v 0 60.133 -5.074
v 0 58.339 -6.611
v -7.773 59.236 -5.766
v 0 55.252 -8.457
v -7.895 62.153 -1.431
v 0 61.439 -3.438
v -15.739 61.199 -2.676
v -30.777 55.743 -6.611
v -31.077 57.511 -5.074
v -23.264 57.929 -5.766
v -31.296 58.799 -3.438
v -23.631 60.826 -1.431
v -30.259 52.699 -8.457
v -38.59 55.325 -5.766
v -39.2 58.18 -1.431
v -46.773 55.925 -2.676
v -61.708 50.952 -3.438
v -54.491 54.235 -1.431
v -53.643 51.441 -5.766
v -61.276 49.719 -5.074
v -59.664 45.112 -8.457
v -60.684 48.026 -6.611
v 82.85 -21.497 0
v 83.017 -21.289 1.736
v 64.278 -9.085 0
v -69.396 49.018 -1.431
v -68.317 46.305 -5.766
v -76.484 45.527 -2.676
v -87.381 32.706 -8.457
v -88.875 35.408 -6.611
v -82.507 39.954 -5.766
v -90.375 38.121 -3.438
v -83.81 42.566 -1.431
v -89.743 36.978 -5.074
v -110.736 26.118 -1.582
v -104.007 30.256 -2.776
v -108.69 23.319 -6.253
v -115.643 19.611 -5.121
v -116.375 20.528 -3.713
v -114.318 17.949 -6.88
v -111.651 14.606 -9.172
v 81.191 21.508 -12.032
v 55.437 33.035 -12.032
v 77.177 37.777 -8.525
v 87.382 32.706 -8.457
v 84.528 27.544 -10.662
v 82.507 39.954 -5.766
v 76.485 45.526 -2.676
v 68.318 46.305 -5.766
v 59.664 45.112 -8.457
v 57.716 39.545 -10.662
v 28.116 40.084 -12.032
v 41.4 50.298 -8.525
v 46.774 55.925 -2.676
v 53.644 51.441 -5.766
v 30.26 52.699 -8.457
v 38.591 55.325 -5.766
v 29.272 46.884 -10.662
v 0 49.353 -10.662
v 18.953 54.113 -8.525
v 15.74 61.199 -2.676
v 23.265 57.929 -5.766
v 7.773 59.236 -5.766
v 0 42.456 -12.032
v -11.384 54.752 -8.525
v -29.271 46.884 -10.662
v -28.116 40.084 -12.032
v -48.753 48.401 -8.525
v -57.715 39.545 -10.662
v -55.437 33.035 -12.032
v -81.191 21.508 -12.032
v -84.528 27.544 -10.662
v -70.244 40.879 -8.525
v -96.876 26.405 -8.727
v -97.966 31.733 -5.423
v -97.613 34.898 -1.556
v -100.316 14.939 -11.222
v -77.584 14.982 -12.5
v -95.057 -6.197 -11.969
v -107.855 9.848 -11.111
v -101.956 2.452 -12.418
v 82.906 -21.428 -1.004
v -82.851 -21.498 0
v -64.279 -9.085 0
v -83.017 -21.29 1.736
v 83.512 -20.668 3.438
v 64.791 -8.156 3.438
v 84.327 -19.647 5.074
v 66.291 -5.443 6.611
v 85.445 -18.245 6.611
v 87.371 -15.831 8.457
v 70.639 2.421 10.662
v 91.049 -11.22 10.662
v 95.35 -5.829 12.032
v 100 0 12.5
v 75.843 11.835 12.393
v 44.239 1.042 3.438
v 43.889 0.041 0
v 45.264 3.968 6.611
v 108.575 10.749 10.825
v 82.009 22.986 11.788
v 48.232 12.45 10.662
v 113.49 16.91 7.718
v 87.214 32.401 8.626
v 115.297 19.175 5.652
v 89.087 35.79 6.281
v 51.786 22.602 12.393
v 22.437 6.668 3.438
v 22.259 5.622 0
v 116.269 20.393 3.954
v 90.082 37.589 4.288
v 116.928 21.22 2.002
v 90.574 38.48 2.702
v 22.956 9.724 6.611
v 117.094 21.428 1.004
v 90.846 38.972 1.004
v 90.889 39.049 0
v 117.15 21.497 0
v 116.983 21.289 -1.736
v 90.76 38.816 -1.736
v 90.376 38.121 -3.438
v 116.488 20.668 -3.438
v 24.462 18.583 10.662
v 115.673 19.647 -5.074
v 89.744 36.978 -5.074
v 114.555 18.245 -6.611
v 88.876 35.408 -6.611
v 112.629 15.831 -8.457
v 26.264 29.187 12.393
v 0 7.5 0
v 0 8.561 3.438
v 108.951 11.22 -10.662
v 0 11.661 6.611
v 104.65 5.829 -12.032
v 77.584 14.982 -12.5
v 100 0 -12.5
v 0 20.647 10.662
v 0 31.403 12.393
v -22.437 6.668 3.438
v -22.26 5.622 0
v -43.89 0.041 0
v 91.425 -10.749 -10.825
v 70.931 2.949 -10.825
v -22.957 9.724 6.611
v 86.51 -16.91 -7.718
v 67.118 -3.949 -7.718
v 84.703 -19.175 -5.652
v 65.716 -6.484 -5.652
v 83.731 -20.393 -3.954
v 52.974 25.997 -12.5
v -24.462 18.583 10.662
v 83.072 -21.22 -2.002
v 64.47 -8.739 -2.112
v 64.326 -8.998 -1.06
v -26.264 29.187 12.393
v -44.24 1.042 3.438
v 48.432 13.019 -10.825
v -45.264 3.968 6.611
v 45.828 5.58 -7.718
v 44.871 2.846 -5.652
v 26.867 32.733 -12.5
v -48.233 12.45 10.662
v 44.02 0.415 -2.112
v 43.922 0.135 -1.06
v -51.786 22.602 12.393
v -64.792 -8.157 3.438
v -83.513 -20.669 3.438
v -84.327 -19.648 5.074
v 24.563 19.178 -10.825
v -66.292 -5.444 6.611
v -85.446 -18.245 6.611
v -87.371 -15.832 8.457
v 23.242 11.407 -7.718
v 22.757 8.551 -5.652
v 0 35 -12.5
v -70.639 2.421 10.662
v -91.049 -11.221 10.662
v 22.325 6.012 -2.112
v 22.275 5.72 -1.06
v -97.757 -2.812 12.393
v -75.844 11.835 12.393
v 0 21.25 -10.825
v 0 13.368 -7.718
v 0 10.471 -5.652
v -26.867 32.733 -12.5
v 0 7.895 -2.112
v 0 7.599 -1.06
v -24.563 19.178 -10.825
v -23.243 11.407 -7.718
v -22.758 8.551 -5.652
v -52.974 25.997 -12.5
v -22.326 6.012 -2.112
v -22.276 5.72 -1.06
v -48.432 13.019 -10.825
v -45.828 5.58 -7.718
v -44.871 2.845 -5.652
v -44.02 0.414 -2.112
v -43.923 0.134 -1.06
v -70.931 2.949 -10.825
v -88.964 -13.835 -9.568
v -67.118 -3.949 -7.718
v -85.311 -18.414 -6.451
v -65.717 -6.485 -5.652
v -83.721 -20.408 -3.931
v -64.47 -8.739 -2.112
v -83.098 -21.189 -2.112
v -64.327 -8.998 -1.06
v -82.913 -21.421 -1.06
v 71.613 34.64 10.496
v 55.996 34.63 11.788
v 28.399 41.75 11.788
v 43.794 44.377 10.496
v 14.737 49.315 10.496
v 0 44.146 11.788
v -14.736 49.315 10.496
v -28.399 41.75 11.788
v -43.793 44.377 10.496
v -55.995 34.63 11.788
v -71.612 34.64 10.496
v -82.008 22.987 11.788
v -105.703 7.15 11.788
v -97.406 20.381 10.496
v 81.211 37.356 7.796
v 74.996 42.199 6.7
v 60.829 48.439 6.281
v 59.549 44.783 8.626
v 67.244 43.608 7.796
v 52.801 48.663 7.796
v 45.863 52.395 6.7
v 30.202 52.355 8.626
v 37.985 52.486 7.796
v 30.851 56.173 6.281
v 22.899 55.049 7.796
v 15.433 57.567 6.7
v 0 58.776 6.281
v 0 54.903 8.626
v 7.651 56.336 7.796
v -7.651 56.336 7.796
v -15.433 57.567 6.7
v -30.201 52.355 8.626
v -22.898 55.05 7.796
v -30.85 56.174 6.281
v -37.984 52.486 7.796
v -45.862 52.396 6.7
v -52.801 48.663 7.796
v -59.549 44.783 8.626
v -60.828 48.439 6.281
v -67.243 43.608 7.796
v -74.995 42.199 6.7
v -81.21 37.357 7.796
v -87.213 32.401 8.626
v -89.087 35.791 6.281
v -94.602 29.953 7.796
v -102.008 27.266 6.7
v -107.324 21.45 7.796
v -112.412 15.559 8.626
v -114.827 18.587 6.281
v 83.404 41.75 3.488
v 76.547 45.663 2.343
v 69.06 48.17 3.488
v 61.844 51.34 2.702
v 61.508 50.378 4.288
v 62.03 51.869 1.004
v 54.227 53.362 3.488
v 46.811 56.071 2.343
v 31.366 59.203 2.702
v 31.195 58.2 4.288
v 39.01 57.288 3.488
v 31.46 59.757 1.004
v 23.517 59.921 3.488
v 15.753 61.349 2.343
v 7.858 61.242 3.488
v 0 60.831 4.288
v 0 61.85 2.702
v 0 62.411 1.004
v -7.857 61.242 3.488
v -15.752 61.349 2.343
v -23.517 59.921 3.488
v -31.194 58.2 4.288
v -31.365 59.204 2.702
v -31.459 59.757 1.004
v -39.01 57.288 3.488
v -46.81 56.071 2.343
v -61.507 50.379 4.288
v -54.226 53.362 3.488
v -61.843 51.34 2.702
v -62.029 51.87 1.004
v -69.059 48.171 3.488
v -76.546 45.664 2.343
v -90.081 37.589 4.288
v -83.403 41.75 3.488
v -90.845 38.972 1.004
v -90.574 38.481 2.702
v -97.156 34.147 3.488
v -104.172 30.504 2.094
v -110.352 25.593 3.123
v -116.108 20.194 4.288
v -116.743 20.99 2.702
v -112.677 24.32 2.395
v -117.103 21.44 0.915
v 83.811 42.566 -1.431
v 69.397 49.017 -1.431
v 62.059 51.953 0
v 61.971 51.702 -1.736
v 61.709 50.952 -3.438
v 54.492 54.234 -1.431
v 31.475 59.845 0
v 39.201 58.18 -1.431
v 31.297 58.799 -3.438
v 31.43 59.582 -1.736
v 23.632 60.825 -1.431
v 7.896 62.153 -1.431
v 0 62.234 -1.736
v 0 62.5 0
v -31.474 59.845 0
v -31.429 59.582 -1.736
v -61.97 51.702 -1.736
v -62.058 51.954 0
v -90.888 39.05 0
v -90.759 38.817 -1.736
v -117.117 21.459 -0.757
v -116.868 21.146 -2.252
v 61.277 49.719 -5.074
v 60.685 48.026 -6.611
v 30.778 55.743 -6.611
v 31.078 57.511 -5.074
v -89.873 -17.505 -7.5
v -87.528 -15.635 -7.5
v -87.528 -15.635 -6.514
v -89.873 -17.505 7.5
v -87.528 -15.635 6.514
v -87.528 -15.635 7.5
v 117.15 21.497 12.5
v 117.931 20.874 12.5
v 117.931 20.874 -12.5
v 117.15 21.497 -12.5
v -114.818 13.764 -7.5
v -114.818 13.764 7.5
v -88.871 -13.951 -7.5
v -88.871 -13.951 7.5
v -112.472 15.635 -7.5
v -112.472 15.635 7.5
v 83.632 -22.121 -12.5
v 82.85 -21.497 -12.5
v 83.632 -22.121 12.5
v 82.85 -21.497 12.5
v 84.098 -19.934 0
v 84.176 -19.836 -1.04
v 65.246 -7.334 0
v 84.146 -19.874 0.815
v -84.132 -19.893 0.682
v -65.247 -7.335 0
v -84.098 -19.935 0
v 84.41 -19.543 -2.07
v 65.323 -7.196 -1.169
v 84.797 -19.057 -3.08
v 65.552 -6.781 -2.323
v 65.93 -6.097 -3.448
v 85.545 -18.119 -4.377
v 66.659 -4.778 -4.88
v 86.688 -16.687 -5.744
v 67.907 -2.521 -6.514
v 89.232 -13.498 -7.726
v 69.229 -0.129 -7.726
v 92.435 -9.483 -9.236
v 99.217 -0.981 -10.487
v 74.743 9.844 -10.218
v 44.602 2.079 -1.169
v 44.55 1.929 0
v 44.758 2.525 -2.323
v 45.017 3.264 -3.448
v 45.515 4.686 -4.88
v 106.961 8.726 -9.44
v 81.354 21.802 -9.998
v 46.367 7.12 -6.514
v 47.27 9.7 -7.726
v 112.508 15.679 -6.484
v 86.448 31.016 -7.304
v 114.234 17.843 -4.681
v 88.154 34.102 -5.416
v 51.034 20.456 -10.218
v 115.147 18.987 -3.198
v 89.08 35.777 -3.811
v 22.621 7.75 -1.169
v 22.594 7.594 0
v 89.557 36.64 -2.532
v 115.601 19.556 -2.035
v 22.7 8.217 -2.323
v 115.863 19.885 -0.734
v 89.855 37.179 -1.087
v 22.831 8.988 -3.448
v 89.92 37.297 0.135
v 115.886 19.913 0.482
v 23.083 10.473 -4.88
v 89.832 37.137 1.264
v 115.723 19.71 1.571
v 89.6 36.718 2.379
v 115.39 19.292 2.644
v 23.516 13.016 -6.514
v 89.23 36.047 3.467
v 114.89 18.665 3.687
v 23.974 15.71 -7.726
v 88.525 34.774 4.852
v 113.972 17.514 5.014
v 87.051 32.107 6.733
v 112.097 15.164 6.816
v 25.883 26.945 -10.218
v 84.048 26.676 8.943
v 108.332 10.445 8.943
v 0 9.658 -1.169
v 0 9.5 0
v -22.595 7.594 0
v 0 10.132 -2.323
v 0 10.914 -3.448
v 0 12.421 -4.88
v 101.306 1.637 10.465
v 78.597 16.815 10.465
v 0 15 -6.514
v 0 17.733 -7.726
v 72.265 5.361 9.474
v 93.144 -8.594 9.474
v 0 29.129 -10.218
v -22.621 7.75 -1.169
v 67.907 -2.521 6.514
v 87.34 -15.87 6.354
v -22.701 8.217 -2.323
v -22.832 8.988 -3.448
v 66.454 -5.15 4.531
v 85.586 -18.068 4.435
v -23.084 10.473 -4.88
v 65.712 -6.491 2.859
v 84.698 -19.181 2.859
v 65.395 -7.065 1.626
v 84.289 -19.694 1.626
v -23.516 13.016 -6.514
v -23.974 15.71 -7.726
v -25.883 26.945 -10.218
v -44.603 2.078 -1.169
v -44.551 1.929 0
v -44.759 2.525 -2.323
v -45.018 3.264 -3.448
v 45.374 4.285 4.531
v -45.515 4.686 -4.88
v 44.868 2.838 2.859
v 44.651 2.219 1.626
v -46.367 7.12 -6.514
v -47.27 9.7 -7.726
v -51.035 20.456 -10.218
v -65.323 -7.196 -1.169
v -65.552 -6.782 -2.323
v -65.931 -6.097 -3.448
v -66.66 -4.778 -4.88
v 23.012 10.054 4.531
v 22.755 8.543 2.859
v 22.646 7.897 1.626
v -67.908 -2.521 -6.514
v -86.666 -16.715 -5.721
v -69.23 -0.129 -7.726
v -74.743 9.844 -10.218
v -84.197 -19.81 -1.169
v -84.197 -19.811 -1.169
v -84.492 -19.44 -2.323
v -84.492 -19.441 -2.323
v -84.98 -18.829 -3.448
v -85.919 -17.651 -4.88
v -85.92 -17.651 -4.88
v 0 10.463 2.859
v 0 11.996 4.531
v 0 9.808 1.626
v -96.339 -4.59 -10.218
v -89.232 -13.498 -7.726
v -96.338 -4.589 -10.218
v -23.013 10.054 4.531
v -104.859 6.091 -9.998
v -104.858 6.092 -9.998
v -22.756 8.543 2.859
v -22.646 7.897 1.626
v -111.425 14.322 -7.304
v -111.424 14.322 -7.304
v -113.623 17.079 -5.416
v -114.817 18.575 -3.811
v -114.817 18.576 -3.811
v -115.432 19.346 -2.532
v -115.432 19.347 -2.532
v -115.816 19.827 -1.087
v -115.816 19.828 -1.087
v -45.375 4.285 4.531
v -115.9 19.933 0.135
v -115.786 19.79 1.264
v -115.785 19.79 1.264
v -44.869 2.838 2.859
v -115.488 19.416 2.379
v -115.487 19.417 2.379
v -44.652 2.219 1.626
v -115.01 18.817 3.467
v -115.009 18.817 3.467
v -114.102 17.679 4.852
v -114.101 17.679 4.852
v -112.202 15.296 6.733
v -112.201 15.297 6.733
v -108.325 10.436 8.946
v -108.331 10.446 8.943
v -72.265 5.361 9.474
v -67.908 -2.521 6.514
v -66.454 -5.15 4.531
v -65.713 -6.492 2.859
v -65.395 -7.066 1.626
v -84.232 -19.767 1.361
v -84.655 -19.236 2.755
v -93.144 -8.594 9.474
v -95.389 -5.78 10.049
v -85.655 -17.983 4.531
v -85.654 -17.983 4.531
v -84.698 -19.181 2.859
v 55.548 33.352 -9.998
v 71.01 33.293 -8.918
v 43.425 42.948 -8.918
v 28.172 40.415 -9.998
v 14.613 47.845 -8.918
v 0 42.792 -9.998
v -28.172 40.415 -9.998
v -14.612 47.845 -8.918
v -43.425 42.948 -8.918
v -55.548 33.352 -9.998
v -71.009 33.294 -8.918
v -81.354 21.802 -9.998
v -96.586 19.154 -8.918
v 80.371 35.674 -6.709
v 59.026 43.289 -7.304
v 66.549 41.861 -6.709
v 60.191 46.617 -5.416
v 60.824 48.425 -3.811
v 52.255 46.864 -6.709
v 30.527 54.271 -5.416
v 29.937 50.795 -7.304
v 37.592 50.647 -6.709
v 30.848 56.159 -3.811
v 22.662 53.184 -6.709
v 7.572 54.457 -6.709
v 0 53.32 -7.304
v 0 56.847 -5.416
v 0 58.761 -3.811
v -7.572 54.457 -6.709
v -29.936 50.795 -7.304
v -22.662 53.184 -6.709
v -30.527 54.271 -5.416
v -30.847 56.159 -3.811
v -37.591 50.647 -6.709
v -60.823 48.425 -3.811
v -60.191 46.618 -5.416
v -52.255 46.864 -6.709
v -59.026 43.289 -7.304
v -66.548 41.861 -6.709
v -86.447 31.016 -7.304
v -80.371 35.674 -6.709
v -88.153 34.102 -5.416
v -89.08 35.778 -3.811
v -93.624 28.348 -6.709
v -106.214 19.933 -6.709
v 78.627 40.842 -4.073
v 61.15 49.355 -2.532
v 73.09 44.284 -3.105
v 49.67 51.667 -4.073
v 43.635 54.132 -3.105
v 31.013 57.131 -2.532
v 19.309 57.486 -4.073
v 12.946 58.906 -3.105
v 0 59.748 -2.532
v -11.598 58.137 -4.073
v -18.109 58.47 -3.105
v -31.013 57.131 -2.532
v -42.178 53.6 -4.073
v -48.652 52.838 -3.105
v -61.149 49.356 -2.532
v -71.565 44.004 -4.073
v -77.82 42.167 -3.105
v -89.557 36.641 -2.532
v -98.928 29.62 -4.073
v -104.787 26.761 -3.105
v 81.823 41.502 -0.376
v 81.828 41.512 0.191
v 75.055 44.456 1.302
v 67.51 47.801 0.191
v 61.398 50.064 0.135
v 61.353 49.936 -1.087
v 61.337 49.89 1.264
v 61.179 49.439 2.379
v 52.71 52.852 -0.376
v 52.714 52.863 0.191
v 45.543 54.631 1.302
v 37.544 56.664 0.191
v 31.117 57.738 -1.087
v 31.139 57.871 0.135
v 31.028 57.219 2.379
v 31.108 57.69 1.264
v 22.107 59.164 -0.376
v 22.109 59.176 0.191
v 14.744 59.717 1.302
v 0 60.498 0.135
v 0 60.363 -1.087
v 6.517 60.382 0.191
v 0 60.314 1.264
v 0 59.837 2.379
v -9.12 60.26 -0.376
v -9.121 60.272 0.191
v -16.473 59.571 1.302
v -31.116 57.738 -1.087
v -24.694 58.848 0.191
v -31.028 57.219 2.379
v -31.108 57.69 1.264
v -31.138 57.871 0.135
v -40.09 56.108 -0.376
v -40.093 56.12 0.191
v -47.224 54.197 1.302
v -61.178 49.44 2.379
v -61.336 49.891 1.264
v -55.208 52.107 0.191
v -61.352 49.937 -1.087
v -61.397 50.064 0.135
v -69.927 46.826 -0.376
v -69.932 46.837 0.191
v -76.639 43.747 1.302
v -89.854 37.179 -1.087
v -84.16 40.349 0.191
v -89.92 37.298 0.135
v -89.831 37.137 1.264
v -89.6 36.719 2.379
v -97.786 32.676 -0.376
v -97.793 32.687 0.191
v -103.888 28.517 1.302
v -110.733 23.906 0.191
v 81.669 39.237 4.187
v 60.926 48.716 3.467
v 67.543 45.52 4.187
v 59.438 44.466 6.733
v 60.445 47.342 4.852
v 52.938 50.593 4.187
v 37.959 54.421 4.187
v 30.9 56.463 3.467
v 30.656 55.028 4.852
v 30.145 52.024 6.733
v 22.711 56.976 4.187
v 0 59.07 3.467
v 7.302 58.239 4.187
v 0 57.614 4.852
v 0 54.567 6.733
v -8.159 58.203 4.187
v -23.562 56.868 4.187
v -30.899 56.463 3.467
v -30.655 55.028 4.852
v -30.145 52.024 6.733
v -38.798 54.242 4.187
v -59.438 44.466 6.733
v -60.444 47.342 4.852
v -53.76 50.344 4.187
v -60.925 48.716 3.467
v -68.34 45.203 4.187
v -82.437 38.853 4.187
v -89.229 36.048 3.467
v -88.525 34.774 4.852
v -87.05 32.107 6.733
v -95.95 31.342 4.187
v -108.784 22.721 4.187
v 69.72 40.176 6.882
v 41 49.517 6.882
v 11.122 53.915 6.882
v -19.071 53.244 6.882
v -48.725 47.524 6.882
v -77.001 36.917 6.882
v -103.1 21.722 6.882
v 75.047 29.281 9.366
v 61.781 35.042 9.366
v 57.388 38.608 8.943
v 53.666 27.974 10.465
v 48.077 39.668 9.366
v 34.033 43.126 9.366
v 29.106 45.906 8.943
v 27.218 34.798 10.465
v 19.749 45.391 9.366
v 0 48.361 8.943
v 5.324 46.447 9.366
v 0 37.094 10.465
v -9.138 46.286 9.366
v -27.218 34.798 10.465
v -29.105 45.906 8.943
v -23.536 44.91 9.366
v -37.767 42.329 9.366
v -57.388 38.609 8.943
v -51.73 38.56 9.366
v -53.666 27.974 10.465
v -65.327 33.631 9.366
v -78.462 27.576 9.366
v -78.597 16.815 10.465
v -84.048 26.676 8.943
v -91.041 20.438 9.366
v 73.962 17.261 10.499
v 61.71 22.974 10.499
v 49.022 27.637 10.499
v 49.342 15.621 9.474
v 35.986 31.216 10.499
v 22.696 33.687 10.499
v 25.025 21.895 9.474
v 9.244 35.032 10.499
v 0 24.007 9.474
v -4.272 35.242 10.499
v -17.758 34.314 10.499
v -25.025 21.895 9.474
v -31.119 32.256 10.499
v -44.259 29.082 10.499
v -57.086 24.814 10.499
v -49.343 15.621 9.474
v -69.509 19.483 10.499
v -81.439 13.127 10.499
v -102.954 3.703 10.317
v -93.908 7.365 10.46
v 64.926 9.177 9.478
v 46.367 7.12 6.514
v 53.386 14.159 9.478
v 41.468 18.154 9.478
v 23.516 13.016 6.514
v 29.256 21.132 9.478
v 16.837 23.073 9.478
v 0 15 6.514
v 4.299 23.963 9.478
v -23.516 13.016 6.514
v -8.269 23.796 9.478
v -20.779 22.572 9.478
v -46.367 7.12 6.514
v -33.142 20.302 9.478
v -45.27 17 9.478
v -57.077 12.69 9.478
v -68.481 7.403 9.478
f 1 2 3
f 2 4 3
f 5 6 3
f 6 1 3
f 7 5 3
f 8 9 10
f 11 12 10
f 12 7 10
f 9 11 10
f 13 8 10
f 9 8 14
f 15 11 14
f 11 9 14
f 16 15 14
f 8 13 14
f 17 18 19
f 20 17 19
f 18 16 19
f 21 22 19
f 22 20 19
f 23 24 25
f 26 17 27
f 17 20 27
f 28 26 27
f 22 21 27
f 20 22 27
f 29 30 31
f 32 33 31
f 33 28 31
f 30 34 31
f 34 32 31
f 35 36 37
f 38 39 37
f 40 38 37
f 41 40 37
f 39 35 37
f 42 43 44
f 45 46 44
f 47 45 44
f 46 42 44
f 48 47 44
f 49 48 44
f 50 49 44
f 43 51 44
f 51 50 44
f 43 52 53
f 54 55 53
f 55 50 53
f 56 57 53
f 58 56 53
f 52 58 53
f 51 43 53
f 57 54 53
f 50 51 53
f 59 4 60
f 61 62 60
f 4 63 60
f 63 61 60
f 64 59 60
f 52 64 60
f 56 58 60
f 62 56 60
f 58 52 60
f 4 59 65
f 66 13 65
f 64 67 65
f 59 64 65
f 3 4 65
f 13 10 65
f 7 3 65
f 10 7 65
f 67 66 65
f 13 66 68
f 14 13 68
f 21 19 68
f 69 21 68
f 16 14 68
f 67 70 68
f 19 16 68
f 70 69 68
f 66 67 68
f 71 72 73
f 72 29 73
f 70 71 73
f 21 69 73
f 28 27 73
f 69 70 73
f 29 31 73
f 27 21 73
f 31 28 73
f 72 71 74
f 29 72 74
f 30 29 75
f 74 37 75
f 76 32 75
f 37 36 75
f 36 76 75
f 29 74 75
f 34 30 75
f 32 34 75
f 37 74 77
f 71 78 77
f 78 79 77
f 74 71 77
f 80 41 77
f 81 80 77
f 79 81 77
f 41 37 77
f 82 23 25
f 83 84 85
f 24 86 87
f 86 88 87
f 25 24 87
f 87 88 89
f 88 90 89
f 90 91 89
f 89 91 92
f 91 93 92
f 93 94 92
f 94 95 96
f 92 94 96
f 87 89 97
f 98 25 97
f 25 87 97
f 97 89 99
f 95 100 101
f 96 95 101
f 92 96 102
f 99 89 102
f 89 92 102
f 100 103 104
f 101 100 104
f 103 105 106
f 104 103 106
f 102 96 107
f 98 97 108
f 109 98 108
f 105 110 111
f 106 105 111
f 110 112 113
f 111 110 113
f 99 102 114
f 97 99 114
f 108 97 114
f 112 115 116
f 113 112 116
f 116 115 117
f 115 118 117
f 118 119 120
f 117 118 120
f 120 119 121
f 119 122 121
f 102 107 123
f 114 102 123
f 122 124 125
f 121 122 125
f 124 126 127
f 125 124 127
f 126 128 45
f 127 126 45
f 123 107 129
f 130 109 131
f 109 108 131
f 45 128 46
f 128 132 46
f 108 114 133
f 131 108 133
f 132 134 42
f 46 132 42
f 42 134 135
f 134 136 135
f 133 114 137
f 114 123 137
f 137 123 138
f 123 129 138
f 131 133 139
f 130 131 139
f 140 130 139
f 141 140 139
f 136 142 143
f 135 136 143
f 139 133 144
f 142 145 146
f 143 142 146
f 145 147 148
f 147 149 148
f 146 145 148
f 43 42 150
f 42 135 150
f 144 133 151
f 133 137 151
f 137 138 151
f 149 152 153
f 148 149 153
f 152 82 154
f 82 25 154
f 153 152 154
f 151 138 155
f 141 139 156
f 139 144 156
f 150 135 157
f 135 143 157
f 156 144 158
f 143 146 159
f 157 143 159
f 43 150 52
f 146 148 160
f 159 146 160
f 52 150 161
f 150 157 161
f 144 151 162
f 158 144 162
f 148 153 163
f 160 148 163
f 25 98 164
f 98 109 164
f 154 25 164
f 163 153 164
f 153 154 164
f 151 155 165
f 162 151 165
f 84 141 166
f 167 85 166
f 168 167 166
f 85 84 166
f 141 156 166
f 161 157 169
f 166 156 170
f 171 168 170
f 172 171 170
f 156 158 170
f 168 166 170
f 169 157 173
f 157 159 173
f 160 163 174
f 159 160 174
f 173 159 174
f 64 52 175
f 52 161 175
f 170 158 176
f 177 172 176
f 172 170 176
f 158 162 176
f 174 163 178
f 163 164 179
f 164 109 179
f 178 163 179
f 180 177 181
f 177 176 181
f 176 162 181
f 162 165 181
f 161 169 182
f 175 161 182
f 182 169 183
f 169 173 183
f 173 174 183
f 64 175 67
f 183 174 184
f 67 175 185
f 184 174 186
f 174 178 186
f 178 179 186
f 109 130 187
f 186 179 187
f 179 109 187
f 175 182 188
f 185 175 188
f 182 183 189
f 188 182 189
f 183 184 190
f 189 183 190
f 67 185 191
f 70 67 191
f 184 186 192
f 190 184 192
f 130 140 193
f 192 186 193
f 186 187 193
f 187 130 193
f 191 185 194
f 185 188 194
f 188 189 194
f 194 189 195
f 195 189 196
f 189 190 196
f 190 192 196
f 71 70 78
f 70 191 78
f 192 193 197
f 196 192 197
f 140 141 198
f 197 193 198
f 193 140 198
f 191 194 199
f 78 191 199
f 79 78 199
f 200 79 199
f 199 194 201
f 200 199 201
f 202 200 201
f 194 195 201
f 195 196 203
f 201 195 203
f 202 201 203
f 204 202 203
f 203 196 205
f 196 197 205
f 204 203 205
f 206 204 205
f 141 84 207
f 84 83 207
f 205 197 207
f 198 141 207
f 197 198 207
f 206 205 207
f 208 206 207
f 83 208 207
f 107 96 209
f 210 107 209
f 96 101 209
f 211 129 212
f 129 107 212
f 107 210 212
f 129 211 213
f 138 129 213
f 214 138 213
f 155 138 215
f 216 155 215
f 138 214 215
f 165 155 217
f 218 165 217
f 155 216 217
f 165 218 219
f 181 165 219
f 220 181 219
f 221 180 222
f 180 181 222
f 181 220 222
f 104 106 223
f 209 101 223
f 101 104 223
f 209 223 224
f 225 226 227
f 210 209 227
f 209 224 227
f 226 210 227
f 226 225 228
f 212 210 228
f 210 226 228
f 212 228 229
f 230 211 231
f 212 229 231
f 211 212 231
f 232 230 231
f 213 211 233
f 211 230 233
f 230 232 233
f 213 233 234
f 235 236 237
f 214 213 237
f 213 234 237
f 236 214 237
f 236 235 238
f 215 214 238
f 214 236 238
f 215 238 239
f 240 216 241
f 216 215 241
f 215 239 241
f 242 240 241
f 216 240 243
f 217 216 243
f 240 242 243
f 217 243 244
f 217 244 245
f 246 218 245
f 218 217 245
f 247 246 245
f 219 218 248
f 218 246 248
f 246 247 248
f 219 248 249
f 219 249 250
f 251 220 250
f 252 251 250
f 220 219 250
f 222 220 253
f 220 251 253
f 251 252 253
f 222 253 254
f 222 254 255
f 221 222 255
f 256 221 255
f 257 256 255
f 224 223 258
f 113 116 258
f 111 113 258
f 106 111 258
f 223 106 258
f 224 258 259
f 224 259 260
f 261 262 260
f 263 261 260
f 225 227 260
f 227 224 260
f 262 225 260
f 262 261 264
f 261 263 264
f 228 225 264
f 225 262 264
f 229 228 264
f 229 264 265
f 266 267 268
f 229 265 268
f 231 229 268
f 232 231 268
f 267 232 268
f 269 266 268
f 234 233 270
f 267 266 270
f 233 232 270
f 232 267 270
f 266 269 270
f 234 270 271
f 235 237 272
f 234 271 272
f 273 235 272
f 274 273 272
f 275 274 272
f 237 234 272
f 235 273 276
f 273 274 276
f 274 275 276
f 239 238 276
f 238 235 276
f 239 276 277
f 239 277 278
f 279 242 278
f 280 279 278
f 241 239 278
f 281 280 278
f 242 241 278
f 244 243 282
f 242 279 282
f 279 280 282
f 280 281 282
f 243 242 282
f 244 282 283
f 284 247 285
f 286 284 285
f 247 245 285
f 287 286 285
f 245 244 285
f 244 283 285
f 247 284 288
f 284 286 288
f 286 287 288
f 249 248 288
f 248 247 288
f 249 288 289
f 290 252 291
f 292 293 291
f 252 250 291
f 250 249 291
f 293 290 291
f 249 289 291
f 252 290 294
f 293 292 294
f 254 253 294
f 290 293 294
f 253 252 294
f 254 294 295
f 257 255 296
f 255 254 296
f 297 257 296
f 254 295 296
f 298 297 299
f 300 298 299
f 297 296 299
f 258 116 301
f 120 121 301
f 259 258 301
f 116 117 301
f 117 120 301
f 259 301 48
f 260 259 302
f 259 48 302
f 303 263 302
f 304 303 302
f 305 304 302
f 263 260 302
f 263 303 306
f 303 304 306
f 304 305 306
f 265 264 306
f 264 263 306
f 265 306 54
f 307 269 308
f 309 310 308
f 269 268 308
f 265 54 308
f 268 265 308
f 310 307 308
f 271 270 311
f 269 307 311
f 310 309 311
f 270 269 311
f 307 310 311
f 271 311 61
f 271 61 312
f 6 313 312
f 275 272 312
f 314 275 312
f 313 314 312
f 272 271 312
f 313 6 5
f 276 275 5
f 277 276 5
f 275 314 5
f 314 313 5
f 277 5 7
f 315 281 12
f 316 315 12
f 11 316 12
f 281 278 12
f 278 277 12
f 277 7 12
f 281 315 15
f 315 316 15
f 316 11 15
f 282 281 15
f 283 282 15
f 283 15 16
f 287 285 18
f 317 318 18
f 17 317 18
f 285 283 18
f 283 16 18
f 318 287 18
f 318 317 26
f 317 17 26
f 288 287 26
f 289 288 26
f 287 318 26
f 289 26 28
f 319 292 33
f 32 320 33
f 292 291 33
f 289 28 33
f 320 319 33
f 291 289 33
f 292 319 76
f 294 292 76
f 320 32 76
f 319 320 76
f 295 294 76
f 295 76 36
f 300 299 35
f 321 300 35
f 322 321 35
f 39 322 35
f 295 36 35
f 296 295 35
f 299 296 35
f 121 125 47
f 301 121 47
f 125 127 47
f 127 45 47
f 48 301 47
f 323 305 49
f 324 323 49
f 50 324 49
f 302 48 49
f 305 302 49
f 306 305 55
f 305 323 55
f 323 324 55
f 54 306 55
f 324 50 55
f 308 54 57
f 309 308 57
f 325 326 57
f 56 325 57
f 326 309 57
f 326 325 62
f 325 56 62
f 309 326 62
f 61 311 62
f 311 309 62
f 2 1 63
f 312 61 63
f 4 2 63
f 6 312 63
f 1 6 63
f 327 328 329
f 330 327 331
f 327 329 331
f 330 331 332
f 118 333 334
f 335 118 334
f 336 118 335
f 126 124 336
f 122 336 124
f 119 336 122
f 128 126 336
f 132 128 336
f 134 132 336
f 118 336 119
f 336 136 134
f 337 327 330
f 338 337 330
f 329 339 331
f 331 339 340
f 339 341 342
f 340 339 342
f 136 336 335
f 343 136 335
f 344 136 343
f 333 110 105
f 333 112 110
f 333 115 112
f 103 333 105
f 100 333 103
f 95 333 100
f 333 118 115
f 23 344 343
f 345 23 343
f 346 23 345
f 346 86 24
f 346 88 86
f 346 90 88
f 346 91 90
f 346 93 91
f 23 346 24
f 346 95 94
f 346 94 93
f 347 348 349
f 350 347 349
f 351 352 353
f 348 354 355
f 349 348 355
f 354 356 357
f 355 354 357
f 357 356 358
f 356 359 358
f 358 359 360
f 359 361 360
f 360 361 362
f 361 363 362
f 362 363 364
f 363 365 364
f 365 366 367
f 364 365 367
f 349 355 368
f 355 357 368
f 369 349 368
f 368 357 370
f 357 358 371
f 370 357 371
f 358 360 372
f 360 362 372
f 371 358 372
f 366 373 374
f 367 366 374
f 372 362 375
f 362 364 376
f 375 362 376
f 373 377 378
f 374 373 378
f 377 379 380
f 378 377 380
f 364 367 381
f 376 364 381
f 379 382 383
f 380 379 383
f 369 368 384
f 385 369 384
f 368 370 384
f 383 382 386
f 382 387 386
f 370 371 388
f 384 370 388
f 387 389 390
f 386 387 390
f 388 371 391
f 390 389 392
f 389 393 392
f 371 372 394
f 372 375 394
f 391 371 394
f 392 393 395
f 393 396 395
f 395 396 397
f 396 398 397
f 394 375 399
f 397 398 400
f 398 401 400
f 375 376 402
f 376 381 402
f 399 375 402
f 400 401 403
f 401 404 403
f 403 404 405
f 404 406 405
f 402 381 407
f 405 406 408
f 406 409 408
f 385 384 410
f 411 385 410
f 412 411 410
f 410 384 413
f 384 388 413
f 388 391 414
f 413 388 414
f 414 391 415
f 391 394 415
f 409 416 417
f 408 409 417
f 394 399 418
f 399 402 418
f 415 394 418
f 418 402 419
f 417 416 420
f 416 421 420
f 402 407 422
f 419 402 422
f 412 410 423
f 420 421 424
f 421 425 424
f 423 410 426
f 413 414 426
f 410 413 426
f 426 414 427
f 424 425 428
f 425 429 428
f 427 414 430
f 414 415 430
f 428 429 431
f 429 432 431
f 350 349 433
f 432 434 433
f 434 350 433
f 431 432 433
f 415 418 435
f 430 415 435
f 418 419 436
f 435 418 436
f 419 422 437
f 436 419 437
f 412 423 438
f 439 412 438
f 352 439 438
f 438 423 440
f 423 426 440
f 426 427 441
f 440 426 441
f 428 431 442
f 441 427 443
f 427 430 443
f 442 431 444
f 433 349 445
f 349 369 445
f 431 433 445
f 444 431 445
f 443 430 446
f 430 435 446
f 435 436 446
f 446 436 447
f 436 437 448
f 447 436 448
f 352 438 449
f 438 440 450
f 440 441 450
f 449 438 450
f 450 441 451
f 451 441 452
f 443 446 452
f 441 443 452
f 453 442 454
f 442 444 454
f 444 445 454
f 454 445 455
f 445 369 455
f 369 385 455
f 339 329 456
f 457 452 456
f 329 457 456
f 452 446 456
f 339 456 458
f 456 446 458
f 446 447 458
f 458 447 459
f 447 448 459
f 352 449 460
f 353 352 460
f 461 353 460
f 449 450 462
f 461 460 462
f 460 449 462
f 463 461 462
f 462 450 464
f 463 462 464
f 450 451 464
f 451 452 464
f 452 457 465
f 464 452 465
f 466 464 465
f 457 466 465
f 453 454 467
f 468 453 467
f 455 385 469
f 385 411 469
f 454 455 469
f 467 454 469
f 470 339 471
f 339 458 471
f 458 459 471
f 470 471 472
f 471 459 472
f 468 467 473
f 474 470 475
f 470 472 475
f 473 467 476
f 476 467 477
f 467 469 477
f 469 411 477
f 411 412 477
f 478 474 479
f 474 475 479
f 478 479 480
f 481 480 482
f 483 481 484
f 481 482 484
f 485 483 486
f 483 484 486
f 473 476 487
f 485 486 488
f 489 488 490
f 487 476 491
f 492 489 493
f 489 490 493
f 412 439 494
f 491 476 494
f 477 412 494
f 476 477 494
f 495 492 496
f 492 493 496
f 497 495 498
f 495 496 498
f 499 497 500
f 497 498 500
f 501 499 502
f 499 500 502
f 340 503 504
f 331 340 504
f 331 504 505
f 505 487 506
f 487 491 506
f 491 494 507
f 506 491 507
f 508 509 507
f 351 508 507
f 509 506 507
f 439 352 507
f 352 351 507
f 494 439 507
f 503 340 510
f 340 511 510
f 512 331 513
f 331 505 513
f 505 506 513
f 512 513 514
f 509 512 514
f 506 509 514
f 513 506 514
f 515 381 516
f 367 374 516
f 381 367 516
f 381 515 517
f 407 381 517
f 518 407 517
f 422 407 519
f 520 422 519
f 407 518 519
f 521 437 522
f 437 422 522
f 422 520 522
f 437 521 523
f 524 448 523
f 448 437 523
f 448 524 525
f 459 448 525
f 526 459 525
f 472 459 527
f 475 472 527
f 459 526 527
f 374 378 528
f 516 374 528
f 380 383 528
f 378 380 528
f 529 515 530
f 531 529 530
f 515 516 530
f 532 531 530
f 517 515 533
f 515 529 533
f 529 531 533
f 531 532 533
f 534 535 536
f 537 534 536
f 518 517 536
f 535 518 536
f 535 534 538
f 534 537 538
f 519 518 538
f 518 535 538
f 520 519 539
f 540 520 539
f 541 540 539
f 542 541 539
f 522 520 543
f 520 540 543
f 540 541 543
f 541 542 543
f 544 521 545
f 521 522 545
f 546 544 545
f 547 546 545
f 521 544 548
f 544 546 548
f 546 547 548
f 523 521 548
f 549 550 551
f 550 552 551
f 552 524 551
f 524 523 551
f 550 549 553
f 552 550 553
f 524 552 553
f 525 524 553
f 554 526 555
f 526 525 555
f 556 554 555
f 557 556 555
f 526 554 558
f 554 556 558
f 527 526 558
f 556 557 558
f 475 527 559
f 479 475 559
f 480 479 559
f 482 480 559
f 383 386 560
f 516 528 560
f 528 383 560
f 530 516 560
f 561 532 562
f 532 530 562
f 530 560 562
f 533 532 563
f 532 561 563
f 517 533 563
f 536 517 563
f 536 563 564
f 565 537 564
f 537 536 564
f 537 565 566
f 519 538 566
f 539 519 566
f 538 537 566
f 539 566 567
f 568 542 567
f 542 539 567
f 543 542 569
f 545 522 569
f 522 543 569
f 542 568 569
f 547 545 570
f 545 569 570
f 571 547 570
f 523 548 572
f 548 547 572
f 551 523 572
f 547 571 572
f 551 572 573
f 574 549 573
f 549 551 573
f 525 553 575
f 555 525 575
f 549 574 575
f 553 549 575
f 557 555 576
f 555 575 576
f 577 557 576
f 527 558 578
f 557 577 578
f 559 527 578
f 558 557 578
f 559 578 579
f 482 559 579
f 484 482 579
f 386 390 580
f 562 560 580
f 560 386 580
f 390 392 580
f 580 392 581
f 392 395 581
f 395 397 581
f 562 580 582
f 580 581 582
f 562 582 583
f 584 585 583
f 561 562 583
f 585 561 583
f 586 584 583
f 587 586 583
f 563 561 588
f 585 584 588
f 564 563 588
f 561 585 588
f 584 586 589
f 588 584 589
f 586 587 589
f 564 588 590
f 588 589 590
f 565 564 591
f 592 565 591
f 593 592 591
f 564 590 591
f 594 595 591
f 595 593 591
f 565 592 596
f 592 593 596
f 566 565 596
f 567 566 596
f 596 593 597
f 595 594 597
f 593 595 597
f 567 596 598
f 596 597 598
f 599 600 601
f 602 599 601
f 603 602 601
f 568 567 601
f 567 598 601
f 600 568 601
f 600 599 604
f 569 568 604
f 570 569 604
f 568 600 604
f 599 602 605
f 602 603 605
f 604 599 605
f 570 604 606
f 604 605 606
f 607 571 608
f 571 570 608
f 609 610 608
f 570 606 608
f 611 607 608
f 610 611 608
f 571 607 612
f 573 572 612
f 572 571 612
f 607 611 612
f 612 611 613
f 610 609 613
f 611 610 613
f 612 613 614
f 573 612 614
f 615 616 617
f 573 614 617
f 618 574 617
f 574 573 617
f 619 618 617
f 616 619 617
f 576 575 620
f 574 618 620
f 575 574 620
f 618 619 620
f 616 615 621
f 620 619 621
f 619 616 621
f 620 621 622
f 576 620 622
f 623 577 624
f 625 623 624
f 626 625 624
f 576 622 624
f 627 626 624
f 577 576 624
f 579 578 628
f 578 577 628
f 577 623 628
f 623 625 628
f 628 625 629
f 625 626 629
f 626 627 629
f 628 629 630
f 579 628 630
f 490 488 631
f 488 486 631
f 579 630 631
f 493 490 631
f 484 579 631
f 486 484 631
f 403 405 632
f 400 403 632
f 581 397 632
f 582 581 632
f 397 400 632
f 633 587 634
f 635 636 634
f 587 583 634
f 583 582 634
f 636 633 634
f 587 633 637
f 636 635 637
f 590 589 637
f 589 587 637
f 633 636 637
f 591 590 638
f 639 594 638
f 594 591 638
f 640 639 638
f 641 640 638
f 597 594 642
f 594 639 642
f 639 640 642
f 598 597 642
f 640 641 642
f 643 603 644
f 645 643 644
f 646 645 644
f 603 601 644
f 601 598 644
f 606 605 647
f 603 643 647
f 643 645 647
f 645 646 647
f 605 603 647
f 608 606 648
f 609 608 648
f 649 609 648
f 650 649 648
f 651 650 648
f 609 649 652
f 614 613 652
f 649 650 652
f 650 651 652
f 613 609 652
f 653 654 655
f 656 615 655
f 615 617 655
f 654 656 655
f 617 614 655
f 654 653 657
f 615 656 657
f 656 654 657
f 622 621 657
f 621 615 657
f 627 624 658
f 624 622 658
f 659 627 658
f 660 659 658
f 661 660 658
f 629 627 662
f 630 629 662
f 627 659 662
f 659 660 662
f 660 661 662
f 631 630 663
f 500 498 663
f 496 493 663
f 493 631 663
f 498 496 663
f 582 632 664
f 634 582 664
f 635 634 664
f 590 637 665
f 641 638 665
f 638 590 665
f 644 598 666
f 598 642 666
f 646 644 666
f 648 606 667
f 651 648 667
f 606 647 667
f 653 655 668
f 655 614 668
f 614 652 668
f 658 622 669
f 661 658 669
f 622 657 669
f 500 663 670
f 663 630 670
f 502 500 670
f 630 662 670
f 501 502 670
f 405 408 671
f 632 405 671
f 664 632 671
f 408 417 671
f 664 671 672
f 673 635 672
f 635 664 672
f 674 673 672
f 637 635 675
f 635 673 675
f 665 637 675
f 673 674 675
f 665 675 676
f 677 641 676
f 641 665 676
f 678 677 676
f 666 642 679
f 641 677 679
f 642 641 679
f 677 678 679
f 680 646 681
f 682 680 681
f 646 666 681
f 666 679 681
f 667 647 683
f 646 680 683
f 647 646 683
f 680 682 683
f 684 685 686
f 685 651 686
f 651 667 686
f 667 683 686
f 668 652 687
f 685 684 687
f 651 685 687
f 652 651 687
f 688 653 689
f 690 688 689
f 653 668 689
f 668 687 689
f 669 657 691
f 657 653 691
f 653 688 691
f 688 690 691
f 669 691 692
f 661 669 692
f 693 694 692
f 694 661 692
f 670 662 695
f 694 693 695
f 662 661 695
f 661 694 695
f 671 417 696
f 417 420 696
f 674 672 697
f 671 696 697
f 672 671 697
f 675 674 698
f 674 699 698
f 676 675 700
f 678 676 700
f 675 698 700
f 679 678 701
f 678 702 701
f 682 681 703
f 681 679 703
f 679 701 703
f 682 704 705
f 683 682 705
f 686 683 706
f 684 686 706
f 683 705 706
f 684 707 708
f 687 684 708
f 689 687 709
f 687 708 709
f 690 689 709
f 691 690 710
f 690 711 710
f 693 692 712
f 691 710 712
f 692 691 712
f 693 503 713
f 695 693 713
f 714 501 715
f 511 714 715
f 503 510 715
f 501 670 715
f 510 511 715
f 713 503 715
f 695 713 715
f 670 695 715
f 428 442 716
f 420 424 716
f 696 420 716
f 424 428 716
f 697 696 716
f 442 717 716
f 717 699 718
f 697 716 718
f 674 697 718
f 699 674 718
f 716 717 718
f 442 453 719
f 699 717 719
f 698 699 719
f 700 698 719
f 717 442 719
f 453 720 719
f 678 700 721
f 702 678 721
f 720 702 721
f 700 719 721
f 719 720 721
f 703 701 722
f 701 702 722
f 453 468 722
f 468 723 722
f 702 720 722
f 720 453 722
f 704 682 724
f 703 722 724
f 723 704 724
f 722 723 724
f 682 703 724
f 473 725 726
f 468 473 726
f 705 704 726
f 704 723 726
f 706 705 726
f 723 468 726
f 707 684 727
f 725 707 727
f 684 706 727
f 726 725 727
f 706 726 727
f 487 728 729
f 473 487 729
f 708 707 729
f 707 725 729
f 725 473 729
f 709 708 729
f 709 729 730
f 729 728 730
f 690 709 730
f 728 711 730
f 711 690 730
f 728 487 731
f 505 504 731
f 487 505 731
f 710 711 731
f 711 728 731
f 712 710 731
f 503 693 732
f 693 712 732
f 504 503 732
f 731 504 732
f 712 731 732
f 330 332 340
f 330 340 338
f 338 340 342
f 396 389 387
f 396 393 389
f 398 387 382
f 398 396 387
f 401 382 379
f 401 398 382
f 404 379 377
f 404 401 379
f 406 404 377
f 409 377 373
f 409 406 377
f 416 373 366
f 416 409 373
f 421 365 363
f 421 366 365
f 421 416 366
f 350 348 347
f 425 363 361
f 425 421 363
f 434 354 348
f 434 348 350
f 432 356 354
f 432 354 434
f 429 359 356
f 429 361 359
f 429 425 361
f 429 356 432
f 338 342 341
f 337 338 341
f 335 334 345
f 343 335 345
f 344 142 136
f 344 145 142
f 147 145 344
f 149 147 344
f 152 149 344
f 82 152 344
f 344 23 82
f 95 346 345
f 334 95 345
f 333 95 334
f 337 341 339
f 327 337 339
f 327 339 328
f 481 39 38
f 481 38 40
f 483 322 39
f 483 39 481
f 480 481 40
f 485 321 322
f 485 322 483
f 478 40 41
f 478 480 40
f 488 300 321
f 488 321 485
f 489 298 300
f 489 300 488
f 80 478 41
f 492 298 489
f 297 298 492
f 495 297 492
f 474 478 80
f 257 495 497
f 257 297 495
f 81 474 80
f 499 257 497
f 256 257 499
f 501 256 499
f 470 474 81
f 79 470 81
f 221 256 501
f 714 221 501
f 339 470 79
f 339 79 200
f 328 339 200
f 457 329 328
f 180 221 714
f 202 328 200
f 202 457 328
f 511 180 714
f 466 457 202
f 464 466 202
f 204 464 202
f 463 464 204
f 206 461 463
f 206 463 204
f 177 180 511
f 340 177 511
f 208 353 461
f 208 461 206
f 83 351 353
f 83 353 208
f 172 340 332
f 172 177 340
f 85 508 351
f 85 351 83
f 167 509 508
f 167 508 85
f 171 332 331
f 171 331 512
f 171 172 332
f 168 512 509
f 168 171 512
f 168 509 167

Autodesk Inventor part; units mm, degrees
ref_plane "YZ Plane" through (0, 0, 0) normal (1, 0, 0) x (0, 1, 0)
sketch "Sketch3" plane through (0, 0, 0) normal (0, 0, 1) x (1, 0, 0)
  line L0 (-140, 0) -> (140, 0) projected
  line L1 (0, -157.4286) -> (0, 67.0714) projected
  arc A0 (100, 0) -> (-100, 0) centre (0, -125.3571) ccw
  line L2 (-90.9685, 35) -> (88.04, 35) construction
  point P0 (0, 0)
  point P1 (0, 35)
  dimension "d0" = 200
  dimension "d1" = 35
ref_plane "Work Plane1" through (100, 0, 0) normal (-0.7817, 0.6236, 0) x (-0.6236, -0.7817, 0)
sketch "Sketch5" plane through (100, 0, 0) normal (-0.7817, 0.6236, 0) x (-0.6236, -0.7817, 0)
  ellipse E0 centre (0, 0) end of major axis (0, -12.5) minor radius 27.5
  ellipse E1 centre (0, 0) end of major axis (0, -10.5) minor radius 25.5
  point P0 (62.3608, 0)
  dimension "d2" = 27.5
  dimension "d3" = 12.5
  dimension "d4" = 25.5
  dimension "d5" = 10.5
sweep "Sweep1" add profiles "Sketch5" path "Sketch3" path curves A0
sketch "Sketch6" plane through (100, 0, 0) normal (-0.7817, 0.6236, 0) x (-0.6236, -0.7817, 0)
  line L0 (27.5, 12.5) -> (-27.5, 12.5)
  line L1 (-27.5, 12.5) -> (-27.5, -12.5)
  line L2 (-27.5, -12.5) -> (27.5, -12.5)
  line L3 (27.5, -12.5) -> (27.5, 12.5)
  line L4 (27.5, 12.5) -> (-27.5, -12.5) construction
  line L5 (-27.5, 12.5) -> (27.5, -12.5) construction
  point P0 (62.3608, 0)
  point P1 (0, 0)
  dimension "d8" = 55
  dimension "d9" = 25
extrude "Extrusion1" add sketch "Sketch6" against normal blind 1
ref_plane "Work Plane2" through (-100, 0, 0) normal (-0.7817, -0.6236, 0) x (0, 0, 1)
sketch "Sketch7" plane through (-100, 0, 0) normal (-0.7817, -0.6236, 0) x (0, 0, 1)
  line L0 (-7.5, -20) -> (7.5, -20)
  line L1 (7.5, -20) -> (7.5, 20)
  line L2 (7.5, 20) -> (-7.5, 20)
  line L3 (-7.5, 20) -> (-7.5, -20)
  line L4 (-7.5, -20) -> (7.5, 20) construction
  line L5 (7.5, -20) -> (-7.5, 20) construction
  point P0 (0, -62.3608)
  point P1 (0, 0)
  dimension "d12" = 15
  dimension "d13" = 40
extrude "Extrusion2" add sketch "Sketch7" along normal blind 3
equation "\"BendRadius\" = Thickness"
equation "\"BendReliefWidth\" = Thickness"
equation "\"BendReliefDepth\" = 0.5 * Thickness"
equation "\"CornerReliefSize\" = 4 * Thickness"
equation "\"MinimumRemnant\" = 2 * Thickness"
equation "\"TransitionRadius\" = BendRadius"
equation "\"JacobiRadiusSize\" = BendRadius"
equation "\"GapSize\" = Thickness"
equation "\"Thickness\" = 0.5"
properties part number "Handle bars holder"
